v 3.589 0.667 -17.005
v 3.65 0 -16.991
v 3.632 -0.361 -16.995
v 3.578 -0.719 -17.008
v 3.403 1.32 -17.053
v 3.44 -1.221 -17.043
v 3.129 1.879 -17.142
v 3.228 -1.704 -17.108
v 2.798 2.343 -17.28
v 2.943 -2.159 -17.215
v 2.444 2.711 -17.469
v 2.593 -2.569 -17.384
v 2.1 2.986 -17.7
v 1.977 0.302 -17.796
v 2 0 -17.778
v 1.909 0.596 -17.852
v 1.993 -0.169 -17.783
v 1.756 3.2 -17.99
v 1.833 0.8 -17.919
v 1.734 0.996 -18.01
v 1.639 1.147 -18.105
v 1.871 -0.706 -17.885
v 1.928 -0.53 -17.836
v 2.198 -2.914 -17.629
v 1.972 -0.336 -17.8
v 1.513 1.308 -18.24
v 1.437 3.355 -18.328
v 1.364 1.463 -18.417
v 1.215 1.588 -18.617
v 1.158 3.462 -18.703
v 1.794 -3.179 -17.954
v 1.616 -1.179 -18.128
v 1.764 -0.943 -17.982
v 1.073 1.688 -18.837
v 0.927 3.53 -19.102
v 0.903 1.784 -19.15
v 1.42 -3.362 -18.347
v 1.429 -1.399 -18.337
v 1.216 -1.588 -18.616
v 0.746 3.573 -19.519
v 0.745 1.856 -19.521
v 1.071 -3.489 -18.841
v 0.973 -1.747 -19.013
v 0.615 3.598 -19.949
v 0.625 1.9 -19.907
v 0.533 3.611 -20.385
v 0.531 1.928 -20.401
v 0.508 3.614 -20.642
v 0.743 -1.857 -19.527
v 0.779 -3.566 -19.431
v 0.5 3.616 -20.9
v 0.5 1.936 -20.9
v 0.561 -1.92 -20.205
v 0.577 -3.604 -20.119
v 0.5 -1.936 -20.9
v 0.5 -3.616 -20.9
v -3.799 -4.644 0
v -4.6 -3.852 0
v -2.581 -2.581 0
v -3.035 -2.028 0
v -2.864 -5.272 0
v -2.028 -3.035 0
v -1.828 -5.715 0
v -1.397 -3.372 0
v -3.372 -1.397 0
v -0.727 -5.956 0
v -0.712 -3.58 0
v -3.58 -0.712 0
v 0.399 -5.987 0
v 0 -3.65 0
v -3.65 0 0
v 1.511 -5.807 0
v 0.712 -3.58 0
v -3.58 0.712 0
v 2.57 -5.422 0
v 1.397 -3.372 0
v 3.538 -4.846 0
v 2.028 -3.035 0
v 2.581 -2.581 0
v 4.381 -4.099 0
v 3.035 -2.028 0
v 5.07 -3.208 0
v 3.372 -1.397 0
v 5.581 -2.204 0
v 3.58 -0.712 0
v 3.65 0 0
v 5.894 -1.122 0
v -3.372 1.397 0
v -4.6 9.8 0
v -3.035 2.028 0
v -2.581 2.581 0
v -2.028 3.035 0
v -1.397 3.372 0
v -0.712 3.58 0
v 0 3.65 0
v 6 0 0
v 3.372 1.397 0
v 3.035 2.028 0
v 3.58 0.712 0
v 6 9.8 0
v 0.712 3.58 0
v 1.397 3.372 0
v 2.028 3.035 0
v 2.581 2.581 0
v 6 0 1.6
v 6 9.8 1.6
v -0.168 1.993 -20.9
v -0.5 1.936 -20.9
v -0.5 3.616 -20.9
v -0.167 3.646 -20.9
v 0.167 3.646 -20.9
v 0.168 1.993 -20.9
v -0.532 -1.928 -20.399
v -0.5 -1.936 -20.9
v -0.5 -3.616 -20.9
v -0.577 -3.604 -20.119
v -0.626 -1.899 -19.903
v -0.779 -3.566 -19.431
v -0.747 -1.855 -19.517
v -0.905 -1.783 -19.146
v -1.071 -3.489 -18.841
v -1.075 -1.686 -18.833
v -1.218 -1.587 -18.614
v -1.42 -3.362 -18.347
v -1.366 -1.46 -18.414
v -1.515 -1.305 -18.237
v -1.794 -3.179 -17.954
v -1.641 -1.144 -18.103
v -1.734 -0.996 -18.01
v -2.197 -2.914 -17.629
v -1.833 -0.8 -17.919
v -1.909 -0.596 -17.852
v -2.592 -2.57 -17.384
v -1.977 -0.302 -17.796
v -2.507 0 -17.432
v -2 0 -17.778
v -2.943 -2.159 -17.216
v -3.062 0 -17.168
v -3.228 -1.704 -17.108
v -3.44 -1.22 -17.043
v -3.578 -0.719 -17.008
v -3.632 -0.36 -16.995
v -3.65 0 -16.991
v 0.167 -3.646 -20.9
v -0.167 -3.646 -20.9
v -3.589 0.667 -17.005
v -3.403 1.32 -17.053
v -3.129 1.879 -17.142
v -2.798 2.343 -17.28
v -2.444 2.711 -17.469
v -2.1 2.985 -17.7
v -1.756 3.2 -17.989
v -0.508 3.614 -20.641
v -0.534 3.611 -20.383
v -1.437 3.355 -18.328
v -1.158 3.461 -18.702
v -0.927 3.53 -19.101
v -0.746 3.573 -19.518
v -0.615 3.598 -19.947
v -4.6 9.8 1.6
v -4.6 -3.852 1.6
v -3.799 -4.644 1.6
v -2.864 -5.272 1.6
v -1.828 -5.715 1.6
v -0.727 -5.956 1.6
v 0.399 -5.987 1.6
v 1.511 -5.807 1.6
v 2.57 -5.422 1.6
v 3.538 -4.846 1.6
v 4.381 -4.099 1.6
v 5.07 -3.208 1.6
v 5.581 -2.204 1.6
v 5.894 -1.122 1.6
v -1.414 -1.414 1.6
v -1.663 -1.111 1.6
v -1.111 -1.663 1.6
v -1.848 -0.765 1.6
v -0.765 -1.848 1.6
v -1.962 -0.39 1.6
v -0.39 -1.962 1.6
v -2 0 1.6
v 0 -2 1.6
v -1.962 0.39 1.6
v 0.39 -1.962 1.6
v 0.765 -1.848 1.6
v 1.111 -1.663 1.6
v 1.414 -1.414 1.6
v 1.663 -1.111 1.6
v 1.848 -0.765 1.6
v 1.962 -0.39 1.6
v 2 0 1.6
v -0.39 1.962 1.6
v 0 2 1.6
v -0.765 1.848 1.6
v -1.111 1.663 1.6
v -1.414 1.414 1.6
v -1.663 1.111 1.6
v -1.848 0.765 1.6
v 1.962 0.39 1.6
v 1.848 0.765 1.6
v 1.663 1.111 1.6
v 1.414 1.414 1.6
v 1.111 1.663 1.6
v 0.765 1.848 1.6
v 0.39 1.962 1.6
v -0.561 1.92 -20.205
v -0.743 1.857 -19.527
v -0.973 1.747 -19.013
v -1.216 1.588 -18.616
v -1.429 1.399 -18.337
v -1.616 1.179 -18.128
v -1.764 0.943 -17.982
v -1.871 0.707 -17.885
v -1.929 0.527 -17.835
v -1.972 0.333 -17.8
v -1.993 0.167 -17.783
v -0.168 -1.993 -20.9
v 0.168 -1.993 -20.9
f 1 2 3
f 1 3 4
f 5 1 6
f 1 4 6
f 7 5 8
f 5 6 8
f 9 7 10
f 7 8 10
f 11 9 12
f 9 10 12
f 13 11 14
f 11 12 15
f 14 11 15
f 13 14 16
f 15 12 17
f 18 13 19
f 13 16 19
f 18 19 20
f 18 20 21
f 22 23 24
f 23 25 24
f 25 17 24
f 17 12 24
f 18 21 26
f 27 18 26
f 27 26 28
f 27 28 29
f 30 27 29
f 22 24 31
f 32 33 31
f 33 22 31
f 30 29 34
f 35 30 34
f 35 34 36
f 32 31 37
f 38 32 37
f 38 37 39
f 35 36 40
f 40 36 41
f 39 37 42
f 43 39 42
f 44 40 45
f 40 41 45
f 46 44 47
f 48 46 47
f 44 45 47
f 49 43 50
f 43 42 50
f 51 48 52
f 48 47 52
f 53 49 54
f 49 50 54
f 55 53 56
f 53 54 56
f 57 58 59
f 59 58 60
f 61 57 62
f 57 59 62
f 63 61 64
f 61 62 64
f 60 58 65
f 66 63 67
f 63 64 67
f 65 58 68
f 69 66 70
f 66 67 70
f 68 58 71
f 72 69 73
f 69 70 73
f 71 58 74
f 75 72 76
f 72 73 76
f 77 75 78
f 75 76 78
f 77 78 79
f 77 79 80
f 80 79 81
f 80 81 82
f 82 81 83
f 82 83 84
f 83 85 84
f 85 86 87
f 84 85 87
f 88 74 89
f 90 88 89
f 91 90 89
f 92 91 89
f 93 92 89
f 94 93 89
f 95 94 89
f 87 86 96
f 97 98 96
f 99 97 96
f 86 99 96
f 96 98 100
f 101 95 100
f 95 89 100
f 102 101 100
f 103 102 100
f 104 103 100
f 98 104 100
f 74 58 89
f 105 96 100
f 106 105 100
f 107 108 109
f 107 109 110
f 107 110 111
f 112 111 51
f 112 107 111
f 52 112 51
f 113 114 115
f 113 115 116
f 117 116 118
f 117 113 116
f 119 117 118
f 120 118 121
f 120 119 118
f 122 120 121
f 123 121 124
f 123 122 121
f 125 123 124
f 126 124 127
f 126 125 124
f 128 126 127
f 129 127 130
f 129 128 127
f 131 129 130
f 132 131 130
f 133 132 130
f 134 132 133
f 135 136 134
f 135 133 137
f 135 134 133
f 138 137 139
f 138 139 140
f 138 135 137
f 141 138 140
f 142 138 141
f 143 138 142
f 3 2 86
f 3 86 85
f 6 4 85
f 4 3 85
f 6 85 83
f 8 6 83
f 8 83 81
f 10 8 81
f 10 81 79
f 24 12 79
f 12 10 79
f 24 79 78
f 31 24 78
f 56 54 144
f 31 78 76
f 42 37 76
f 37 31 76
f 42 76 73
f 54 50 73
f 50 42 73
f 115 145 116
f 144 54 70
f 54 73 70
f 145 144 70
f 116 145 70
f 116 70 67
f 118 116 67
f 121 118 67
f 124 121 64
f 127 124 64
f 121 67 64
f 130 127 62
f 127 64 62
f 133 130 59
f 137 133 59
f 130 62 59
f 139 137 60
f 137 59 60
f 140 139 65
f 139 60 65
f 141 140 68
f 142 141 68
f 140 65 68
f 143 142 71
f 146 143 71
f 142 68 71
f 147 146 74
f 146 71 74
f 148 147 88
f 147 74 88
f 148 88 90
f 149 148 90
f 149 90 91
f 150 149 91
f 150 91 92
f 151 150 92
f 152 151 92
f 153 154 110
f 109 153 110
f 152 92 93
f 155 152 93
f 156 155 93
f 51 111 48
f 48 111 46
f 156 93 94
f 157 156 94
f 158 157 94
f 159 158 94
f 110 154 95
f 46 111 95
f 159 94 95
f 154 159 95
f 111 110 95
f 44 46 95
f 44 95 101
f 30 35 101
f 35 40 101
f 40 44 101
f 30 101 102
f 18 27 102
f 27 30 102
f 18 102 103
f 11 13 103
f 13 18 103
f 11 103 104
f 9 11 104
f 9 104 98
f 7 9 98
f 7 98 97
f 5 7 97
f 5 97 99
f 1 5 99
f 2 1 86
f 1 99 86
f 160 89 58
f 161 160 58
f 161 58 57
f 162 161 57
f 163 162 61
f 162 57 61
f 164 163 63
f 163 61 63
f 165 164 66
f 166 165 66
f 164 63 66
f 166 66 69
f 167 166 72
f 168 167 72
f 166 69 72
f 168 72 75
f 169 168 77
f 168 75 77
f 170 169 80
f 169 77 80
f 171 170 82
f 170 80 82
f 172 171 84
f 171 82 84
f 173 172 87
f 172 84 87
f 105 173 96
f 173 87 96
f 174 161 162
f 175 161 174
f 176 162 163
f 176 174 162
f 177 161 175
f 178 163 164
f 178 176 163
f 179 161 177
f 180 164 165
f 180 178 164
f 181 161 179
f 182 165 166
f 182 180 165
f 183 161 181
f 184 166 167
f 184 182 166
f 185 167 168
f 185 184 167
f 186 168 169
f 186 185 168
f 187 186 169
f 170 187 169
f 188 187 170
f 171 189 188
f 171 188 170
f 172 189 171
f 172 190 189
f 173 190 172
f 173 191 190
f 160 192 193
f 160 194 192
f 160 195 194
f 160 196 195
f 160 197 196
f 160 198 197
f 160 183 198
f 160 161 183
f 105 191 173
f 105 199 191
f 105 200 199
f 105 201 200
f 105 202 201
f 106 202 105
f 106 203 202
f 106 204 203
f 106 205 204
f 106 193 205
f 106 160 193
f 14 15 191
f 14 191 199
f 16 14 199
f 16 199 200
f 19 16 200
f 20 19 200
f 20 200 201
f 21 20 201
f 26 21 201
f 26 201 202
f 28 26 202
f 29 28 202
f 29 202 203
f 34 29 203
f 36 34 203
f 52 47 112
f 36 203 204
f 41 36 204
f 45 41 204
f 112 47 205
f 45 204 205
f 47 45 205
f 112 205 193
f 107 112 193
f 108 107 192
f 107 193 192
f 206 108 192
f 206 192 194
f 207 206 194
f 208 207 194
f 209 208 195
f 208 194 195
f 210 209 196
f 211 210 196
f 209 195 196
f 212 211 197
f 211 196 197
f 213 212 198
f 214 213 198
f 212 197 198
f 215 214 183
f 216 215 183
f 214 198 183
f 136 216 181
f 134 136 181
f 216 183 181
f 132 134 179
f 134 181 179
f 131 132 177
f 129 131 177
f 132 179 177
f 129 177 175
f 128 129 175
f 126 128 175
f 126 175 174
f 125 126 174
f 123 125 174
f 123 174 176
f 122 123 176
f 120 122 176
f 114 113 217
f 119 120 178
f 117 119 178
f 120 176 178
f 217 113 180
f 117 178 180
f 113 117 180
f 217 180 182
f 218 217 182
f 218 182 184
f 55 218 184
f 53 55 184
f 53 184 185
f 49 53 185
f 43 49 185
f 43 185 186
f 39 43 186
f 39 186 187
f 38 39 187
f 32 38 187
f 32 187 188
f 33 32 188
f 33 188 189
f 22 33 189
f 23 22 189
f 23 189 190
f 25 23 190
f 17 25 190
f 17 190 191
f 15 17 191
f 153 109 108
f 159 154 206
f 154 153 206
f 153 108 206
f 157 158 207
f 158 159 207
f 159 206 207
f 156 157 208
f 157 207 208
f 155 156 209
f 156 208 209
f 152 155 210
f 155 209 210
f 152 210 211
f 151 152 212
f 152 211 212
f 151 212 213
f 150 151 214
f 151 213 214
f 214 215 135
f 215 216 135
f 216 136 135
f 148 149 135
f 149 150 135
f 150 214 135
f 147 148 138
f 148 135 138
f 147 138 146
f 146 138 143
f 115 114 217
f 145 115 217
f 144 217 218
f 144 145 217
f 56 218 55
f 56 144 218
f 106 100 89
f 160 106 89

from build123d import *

# Parameters (mm, degrees)
F1_DEPTH      = 1.6
F2_R          = 3.65
F3_DEPTH      = 20.9
F4_R          = 4
F5_DEPTH      = 25
F5_DEPTH_BACK = 25
F6_R          = 2
F7_DEPTH      = 22.5010001


with BuildPart() as f1:
    # F0 (on Top) → F1 (new body)
    with BuildSketch(Plane.XY):
        with BuildLine():
            Line((-4.6, 9.8), (-4.6, -3.8522720569))
            ThreePointArc((-4.6, -3.8522720569), (2.0493901532, -5.6391488719), (6, 0))
            Line((6, 0), (6, 9.8))
            Line((6, 9.8), (-4.6, 9.8))
        make_face()
    extrude(amount=F1_DEPTH)

    # F2 (on face) → F3 (join)
    with BuildSketch(Plane(origin=(0, 0, 0), x_dir=(1, 0, 0), z_dir=(0, 0, -1))):
        Circle(F2_R)
    extrude(amount=F3_DEPTH)

    # F4 (on Front) → F5 (cut, two sides)
    with BuildSketch(Plane.XZ) as f5_sk:
        with Locations((4.5, -20.9)):
            Circle(F4_R)
        with Locations((-4.5, -20.9)):
            Circle(F4_R)
    extrude(amount=-F5_DEPTH, mode=Mode.SUBTRACT)
    extrude(f5_sk.sketch, amount=F5_DEPTH_BACK, mode=Mode.SUBTRACT)

    # F6 (on face) → F7 (cut, through all)
    with BuildSketch(Plane.XY.offset(1.6)):
        Circle(F6_R)
    extrude(amount=-F7_DEPTH, mode=Mode.SUBTRACT)


solid = f1.part
